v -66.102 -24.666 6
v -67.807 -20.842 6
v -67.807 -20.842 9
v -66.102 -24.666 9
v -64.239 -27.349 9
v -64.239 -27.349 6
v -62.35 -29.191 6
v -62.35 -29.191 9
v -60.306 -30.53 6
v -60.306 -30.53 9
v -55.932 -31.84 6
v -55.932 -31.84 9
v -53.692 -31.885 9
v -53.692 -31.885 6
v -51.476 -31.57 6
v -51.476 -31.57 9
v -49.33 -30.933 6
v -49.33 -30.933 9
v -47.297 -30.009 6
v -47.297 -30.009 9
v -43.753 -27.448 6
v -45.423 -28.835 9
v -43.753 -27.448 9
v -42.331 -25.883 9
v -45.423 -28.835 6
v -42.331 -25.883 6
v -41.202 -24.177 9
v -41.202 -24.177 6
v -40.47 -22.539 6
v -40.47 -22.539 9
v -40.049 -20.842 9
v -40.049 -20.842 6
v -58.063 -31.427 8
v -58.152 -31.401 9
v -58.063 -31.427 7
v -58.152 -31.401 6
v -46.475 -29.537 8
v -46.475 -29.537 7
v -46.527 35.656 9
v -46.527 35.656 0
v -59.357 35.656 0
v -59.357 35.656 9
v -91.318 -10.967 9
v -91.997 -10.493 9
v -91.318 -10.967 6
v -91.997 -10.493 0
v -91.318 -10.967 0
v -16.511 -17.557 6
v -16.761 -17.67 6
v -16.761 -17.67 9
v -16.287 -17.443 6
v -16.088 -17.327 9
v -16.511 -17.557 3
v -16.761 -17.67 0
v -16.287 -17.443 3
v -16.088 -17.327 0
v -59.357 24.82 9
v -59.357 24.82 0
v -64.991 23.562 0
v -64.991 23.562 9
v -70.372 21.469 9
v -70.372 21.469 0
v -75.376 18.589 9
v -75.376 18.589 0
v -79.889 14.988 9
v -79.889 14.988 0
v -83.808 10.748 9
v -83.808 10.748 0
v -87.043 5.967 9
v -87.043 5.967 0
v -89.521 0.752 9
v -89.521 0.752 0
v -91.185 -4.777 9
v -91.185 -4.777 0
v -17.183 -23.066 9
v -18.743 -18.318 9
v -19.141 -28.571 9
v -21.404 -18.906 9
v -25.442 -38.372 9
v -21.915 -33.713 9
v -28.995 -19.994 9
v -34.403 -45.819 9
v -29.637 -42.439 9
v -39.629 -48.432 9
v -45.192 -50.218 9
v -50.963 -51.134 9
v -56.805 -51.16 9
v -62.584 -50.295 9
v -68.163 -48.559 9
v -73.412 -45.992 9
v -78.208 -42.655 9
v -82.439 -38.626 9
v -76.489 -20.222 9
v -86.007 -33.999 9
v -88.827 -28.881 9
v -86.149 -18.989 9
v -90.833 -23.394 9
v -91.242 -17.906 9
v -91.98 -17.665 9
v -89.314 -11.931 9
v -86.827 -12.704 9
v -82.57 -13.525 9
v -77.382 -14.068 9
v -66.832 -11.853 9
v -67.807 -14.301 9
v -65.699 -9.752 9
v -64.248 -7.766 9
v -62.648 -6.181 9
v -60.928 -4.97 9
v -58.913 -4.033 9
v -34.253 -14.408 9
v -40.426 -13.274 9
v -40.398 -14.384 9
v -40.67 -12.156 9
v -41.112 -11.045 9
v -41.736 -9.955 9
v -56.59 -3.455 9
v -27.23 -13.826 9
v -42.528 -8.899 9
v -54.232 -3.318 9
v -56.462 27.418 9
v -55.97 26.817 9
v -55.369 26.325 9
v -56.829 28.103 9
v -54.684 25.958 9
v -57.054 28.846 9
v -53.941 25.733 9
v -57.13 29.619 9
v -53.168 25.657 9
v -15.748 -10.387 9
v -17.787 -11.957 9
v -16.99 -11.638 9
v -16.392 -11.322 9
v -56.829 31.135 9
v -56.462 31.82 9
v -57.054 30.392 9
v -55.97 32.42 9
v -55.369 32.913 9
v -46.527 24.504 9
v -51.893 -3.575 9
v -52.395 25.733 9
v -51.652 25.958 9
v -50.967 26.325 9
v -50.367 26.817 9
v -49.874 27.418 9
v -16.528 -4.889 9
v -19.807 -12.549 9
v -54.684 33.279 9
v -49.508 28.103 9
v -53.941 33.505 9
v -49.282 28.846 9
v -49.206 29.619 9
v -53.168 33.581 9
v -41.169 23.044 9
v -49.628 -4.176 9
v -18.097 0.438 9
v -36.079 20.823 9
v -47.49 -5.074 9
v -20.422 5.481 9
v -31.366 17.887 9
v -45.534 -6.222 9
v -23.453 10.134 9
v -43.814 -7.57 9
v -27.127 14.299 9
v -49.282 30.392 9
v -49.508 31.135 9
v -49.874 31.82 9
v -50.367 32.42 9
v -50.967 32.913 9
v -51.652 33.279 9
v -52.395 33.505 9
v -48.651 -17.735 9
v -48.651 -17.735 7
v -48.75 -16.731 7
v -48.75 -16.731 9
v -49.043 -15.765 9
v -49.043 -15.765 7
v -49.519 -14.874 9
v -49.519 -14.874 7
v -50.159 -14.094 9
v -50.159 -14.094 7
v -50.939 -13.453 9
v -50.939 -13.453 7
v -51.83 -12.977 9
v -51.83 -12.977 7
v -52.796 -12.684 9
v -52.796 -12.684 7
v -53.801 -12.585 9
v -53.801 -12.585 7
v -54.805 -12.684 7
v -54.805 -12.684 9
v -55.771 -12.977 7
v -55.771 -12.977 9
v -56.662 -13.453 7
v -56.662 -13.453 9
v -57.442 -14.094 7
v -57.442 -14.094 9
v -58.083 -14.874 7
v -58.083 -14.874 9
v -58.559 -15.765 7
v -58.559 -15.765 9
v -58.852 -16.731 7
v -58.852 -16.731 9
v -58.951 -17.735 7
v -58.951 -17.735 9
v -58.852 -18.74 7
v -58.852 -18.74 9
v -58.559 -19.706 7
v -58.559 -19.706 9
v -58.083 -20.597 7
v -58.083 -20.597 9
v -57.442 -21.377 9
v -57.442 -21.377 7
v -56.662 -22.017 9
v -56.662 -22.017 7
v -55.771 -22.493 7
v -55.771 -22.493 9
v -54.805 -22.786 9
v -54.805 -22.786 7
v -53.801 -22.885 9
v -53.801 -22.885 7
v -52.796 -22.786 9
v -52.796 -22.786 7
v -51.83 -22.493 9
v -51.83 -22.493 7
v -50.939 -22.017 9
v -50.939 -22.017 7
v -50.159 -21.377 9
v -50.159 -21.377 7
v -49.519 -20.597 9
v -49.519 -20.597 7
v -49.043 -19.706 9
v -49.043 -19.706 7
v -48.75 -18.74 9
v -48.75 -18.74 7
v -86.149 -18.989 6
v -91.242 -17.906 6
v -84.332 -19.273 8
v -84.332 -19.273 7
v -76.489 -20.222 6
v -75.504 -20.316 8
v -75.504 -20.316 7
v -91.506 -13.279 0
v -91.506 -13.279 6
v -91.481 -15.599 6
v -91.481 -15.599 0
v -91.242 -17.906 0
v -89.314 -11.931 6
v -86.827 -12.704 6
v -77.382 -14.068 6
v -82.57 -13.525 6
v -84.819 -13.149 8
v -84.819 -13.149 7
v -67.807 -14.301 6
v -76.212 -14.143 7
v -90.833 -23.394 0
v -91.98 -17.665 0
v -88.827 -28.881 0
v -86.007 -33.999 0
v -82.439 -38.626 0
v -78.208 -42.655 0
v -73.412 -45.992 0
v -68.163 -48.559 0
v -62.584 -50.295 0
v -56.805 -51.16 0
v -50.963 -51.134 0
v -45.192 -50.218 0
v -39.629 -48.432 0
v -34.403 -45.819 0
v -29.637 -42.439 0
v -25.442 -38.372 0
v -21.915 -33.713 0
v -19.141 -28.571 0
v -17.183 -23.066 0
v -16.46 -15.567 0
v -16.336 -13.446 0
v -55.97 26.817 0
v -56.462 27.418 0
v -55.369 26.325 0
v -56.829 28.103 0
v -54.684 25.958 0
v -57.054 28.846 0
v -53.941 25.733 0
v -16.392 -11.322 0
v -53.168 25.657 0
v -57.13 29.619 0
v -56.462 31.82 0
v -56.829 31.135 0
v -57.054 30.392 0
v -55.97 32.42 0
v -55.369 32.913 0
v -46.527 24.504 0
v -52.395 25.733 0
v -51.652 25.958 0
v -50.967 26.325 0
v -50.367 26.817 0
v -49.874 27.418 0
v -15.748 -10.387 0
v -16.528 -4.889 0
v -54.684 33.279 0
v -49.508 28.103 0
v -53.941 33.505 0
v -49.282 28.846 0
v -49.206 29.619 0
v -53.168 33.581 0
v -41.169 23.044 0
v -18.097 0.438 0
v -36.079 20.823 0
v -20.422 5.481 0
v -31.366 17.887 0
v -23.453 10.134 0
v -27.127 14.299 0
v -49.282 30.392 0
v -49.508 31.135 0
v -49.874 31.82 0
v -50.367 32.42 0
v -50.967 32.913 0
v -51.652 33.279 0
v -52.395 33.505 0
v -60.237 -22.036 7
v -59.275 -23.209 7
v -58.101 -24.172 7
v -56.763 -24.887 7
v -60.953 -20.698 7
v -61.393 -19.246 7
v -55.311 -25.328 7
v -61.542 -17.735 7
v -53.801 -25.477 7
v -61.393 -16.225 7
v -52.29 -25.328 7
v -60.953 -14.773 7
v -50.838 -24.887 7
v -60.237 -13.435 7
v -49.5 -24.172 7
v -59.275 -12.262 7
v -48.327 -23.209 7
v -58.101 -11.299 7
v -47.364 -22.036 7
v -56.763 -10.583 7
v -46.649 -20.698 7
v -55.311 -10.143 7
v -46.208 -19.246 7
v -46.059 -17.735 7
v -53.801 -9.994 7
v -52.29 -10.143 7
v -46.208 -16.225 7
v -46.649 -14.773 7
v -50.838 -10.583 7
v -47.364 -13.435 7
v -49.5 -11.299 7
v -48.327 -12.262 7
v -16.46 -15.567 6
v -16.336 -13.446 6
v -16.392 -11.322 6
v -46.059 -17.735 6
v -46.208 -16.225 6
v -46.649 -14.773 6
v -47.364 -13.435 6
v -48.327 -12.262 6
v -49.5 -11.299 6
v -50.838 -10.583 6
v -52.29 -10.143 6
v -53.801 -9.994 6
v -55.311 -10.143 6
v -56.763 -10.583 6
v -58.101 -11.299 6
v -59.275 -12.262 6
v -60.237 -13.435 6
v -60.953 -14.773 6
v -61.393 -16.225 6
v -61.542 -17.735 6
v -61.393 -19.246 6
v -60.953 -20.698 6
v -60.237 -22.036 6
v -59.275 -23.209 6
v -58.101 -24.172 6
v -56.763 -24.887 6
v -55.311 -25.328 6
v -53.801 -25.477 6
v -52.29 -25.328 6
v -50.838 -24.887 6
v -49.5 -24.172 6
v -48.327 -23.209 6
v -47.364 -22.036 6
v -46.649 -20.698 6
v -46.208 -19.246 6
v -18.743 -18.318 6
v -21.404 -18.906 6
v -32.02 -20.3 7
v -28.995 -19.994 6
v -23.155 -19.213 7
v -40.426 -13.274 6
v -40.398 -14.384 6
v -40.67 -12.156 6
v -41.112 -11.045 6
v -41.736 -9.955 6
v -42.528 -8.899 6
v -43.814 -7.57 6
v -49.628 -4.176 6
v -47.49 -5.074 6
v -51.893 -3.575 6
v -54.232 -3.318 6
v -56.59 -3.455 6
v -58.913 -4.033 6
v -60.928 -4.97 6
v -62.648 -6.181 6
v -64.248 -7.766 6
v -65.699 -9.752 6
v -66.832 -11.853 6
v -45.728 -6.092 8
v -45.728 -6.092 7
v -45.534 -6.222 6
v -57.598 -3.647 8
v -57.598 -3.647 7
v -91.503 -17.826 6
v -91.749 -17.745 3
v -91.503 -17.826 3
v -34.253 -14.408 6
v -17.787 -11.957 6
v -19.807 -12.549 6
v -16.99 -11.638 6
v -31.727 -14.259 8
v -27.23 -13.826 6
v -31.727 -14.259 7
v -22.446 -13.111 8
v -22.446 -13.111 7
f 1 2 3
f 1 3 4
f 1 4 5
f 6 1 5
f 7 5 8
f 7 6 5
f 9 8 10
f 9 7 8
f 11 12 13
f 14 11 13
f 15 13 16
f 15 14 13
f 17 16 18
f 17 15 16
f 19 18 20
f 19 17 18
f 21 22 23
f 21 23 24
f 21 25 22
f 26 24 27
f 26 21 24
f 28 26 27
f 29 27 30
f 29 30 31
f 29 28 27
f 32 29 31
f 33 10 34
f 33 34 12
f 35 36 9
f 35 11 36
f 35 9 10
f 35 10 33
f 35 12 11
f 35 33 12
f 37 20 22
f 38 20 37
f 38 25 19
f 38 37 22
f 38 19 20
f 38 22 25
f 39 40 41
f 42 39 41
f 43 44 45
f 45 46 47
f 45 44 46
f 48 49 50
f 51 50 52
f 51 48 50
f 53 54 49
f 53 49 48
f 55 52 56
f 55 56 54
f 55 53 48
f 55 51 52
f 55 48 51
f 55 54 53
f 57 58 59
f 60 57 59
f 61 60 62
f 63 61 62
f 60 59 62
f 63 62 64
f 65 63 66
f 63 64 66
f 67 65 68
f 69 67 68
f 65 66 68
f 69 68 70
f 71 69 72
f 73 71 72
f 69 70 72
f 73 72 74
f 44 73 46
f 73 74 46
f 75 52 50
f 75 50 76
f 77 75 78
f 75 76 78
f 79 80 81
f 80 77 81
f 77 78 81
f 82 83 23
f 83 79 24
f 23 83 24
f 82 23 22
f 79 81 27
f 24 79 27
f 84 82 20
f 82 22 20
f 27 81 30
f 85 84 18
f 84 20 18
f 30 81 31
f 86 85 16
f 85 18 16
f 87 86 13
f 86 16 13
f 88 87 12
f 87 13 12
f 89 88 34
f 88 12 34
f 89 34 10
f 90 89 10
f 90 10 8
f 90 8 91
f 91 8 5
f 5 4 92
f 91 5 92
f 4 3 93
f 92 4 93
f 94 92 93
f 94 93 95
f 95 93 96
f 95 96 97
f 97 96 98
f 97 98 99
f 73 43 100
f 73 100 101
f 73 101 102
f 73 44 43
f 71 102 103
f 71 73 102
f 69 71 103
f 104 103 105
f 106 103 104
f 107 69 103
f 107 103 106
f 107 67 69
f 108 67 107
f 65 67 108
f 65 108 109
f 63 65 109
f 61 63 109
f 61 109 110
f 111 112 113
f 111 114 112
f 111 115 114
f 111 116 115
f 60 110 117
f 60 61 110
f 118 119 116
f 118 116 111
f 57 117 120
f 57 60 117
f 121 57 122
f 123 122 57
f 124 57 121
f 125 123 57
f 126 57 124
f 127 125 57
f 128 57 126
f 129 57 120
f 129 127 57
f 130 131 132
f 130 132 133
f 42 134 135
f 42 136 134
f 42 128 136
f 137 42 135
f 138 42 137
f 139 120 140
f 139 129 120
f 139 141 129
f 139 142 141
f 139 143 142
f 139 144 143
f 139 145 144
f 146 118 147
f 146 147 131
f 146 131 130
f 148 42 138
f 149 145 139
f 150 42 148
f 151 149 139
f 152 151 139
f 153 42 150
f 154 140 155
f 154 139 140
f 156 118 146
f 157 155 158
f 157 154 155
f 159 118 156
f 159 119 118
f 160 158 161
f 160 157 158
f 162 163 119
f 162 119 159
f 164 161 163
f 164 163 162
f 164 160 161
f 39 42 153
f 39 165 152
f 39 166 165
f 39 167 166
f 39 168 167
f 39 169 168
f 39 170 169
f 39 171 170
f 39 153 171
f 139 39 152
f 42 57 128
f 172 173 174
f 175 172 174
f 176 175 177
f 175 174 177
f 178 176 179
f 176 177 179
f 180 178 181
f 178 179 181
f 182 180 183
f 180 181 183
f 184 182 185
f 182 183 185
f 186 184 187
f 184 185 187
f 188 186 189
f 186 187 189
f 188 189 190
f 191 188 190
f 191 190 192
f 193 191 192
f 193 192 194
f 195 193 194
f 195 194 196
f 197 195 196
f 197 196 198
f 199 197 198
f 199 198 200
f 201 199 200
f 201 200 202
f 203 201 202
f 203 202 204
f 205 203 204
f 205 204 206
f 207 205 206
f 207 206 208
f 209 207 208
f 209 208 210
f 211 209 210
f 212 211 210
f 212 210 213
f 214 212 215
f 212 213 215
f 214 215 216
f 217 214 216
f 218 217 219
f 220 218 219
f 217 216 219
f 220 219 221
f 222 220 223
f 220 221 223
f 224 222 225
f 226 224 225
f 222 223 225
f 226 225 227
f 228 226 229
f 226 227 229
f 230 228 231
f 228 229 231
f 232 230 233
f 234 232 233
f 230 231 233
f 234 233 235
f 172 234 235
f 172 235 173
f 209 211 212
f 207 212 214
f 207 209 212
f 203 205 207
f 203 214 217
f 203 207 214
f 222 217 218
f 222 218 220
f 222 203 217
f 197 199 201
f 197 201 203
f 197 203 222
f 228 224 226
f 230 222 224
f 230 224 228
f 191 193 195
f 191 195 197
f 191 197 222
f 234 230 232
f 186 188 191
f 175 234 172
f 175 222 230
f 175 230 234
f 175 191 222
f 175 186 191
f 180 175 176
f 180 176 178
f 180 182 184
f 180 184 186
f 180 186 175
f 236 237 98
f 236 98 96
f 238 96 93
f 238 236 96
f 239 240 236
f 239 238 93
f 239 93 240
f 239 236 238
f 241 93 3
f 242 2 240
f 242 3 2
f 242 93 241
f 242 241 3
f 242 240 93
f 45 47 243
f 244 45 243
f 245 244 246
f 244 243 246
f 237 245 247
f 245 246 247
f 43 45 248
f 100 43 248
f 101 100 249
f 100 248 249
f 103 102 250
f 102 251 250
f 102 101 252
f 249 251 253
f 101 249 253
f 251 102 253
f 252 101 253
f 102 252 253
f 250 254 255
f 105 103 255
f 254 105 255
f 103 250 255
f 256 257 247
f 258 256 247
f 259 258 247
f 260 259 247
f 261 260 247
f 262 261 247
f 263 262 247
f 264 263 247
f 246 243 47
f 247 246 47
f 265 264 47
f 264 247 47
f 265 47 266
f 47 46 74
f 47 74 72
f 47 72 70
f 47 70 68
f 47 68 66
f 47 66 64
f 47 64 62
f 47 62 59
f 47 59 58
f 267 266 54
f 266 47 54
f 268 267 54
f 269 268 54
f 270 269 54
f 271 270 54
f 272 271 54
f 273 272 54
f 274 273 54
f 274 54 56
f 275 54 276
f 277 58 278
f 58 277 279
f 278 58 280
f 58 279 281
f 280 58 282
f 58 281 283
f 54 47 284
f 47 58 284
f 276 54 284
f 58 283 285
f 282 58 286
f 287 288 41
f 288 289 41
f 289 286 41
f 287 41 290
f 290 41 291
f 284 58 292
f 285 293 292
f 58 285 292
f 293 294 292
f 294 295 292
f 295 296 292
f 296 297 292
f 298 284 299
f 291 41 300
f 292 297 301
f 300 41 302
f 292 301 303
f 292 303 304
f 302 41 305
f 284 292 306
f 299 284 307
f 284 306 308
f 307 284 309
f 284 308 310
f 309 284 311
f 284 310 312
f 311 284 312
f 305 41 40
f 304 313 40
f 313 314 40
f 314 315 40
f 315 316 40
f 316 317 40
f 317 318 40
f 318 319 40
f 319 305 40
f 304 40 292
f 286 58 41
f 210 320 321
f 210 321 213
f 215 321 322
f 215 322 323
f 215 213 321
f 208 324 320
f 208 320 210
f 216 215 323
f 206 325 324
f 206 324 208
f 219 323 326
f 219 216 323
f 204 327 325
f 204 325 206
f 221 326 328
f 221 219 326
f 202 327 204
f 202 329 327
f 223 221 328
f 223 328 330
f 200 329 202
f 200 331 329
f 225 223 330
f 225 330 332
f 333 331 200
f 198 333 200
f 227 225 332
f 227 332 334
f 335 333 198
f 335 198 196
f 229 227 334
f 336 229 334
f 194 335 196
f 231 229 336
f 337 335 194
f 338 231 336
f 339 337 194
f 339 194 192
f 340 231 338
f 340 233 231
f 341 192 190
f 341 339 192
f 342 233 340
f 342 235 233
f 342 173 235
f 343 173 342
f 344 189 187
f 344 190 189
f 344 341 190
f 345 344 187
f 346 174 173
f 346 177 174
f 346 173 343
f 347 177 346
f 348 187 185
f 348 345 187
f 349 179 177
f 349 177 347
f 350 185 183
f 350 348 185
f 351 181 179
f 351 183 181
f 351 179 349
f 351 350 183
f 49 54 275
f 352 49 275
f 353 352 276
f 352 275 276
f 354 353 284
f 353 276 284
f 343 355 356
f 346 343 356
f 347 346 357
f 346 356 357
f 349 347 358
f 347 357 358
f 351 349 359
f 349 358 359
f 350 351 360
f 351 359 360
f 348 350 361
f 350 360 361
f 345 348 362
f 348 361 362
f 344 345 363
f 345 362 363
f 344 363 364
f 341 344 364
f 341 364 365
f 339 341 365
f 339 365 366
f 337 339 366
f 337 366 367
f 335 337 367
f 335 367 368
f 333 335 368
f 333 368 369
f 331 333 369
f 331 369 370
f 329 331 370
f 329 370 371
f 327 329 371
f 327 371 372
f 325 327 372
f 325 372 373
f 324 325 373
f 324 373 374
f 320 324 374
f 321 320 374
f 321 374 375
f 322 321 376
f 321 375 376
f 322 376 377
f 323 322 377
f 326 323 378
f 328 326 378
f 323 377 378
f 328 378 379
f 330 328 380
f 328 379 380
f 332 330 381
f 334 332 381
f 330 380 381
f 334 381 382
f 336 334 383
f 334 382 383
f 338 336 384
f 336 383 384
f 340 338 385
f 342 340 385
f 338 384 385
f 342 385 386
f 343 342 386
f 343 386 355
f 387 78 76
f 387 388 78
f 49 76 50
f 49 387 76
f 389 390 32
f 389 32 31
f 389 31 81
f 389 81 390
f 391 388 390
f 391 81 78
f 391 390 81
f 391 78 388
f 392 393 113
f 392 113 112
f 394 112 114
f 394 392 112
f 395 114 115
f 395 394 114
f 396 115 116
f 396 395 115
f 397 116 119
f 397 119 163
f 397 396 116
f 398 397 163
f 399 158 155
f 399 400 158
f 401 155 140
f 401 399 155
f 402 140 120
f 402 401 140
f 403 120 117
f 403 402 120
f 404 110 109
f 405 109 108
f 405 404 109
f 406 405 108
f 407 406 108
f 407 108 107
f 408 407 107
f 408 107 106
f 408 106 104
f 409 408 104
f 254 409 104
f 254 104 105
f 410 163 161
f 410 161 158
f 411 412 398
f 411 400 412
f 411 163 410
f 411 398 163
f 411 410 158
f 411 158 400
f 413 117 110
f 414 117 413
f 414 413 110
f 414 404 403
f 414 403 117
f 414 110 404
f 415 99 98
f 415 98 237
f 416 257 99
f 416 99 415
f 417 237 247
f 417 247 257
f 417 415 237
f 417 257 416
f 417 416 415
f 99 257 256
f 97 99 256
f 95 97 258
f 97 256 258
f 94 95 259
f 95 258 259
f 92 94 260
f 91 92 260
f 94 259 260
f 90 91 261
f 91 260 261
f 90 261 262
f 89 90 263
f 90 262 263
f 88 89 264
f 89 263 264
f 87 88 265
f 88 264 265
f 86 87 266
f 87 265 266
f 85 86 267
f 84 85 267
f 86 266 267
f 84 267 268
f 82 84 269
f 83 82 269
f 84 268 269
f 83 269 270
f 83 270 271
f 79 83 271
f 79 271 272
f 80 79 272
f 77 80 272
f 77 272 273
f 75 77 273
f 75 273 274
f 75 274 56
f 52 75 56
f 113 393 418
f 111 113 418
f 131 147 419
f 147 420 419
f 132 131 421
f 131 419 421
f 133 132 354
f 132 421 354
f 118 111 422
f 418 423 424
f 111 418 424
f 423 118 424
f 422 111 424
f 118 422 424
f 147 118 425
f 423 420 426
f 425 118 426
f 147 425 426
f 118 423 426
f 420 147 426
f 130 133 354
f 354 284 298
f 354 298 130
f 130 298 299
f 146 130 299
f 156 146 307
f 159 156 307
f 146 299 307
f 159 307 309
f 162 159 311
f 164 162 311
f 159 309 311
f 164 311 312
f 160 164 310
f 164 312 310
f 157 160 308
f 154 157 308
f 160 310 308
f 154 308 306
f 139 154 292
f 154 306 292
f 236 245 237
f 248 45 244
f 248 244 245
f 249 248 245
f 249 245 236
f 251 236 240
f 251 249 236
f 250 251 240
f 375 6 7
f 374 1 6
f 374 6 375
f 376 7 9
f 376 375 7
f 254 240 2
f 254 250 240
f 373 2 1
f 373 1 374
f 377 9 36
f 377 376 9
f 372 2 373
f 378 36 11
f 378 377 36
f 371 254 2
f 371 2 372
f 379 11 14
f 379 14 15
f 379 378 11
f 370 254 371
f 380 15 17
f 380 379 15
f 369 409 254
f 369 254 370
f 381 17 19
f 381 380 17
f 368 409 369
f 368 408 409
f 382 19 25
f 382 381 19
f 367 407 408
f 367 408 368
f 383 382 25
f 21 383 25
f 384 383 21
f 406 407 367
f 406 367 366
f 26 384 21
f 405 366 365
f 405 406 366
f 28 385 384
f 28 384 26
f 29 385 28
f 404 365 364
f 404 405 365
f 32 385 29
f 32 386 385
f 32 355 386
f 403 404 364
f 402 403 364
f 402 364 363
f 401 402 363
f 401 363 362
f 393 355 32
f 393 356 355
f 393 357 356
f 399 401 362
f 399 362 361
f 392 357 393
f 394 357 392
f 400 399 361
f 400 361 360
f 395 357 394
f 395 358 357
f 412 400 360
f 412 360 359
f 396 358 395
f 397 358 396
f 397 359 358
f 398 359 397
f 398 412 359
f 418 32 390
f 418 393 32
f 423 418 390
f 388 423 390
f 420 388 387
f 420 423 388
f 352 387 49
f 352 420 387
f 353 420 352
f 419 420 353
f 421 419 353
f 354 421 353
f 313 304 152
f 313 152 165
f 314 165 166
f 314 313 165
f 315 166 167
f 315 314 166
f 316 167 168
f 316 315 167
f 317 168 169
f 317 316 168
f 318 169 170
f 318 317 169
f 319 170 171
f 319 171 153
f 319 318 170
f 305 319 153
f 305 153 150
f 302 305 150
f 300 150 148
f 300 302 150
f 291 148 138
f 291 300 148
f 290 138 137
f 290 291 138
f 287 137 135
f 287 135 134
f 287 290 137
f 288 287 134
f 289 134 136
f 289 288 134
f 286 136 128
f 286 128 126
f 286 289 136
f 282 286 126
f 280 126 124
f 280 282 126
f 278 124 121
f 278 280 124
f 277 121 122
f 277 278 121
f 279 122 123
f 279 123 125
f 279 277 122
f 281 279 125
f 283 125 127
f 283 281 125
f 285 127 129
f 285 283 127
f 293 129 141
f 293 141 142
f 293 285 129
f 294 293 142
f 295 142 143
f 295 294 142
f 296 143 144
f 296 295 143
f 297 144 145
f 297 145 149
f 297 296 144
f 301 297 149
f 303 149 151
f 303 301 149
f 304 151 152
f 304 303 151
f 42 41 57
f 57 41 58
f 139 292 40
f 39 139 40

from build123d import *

# Parameters (mm, degrees)
F0_R     = 5.150035
F0_R_2   = 3.961987
F1_DEPTH = 9
F0_R_3   = 7.741214
F2_DEPTH = 6
F3_DEPTH = 7


with BuildPart() as f1:
    # F0 (on Top) → F1 (new body)
    with BuildSketch(Plane.XY):
        with BuildLine():
            add(Edge.make_bspline(
                [(-91.317542, -10.967116), (-86.64373, -13.858178), (-75.341257, -14.445624), (-67.806959, -14.301113)],
                knots=[1.221144, 1.221144, 1.221144, 1.221144, 24.488166, 24.488166, 24.488166, 24.488166], degree=3))
            add(Edge.make_bspline(
                [(-40.39795, -14.383757), (-39.723586, -5.585385), (-61.1616, 5.31907), (-67.806959, -14.301113)],
                knots=[0, 0, 0, 0, 27.409134, 27.409134, 27.409134, 27.409134], degree=3))
            add(Edge.make_bspline(
                [(-40.39795, -14.383757), (-33.312143, -14.897632), (-19.552754, -13.304103), (-16.391562, -11.32243)],
                knots=[0, 0, 0, 0, 21.643832, 21.643832, 21.643832, 21.643832], degree=3))
            Line((-16.391562, -11.32243), (-15.747862, -10.386982))
            ThreePointArc((-15.747862, -10.386982), (-25.2145, 12.283506), (-46.526868, 24.50444))
            Line((-46.526868, 24.50444), (-46.526868, 23.27941))
            Line((-46.526868, 23.27941), (-59.356738, 23.27941))
            Line((-59.356738, 23.27941), (-59.356738, 24.820338))
            ThreePointArc((-59.356738, 24.820338), (-81.928546, 12.942305), (-91.997162, -10.49265))
            Line((-91.997162, -10.49265), (-91.317542, -10.967116))
        make_face()
        with BuildLine():
            add(Edge.make_bspline(
                [(-67.806959, -20.841723), (-61.319683, -39.555024), (-41.559912, -31.048808), (-40.048894, -20.841723)],
                knots=[0, 0, 0, 0, 27.758066, 27.758066, 27.758066, 27.758066], degree=3))
            add(Edge.make_bspline(
                [(-91.241727, -17.905849), (-86.307066, -19.370394), (-73.921331, -20.639642), (-67.806959, -20.841723)],
                knots=[1.260164, 1.260164, 1.260164, 1.260164, 24.380885, 24.380885, 24.380885, 24.380885], degree=3))
            add(Edge.make_bspline(
                [(-91.979973, -17.664781), (-91.757507, -17.745623), (-91.510684, -17.826026), (-91.241727, -17.905849)],
                knots=[0, 0, 0, 0, 1.260164, 1.260164, 1.260164, 1.260164], degree=3))
            ThreePointArc((-91.979973, -17.664781), (-53.883548, -51.259255), (-16.087698, -17.32697))
            add(Edge.make_bspline(
                [(-16.761014, -17.670424), (-16.49914, -17.558172), (-16.273367, -17.443651), (-16.087698, -17.32697)],
                knots=[22.749196, 22.749196, 22.749196, 22.749196, 24.217605, 24.217605, 24.217605, 24.217605], degree=3))
            add(Edge.make_bspline(
                [(-40.048894, -20.841723), (-33.540111, -20.603637), (-20.818081, -19.409468), (-16.761014, -17.670424)],
                knots=[0, 0, 0, 0, 22.749196, 22.749196, 22.749196, 22.749196], degree=3))
        make_face()
        with Locations((-53.800639, -17.735399)):
            Circle(F0_R)
        with BuildLine():
            Line((-59.356738, 35.656463), (-59.356738, 24.820338))
            ThreePointArc((-59.356738, 24.820338), (-52.928445, 25.204892), (-46.526868, 24.50444))
            Line((-46.526868, 24.50444), (-46.526868, 35.656463))
            Line((-46.526868, 35.656463), (-59.356738, 35.656463))
        make_face()
        with Locations((-53.168215, 29.618876)):
            Circle(F0_R_2, mode=Mode.SUBTRACT)
        with BuildLine():
            ThreePointArc((-46.526868, 24.50444), (-52.928445, 25.204892), (-59.356738, 24.820338))
            Line((-59.356738, 24.820338), (-59.356738, 23.27941))
            Line((-59.356738, 23.27941), (-46.526868, 23.27941))
            Line((-46.526868, 23.27941), (-46.526868, 24.50444))
        make_face()
    extrude(amount=F1_DEPTH)

    # F0 (on Top) → F2 (join)
    with BuildSketch(Plane.XY):
        with BuildLine():
            add(Edge.make_bspline(
                [(-91.241727, -17.905849), (-86.307066, -19.370394), (-73.921331, -20.639642), (-67.806959, -20.841723)],
                knots=[1.260164, 1.260164, 1.260164, 1.260164, 24.380885, 24.380885, 24.380885, 24.380885], degree=3))
            Line((-67.806959, -20.841723), (-67.806959, -14.301113))
            add(Edge.make_bspline(
                [(-91.317542, -10.967116), (-86.64373, -13.858178), (-75.341257, -14.445624), (-67.806959, -14.301113)],
                knots=[1.221144, 1.221144, 1.221144, 1.221144, 24.488166, 24.488166, 24.488166, 24.488166], degree=3))
            ThreePointArc((-91.317542, -10.967116), (-91.519995, -14.439109), (-91.241727, -17.905849))
        make_face()
        with BuildLine():
            Line((-40.39795, -14.383757), (-40.048894, -20.841723))
            add(Edge.make_bspline(
                [(-40.048894, -20.841723), (-33.540111, -20.603637), (-20.818081, -19.409468), (-16.761014, -17.670424)],
                knots=[0, 0, 0, 0, 22.749196, 22.749196, 22.749196, 22.749196], degree=3))
            ThreePointArc((-16.761014, -17.670424), (-16.375445, -14.508116), (-16.391562, -11.32243))
            add(Edge.make_bspline(
                [(-40.39795, -14.383757), (-33.312143, -14.897632), (-19.552754, -13.304103), (-16.391562, -11.32243)],
                knots=[0, 0, 0, 0, 21.643832, 21.643832, 21.643832, 21.643832], degree=3))
        make_face()
        with BuildLine():
            Line((-67.806959, -14.301113), (-67.806959, -20.841723))
            add(Edge.make_bspline(
                [(-67.806959, -20.841723), (-61.319683, -39.555024), (-41.559912, -31.048808), (-40.048894, -20.841723)],
                knots=[0, 0, 0, 0, 27.758066, 27.758066, 27.758066, 27.758066], degree=3))
            Line((-40.048894, -20.841723), (-40.39795, -14.383757))
            add(Edge.make_bspline(
                [(-40.39795, -14.383757), (-39.723586, -5.585385), (-61.1616, 5.31907), (-67.806959, -14.301113)],
                knots=[0, 0, 0, 0, 27.409134, 27.409134, 27.409134, 27.409134], degree=3))
        make_face()
        with Locations((-53.800639, -17.735399)):
            Circle(F0_R_3, mode=Mode.SUBTRACT)
    extrude(amount=F2_DEPTH)

    # F0 (on Top) → F3 (join)
    with BuildSketch(Plane.XY):
        with Locations((-53.800639, -17.735399)):
            Circle(F0_R_3)
        with Locations((-53.800639, -17.735399)):
            Circle(F0_R, mode=Mode.SUBTRACT)
    extrude(amount=F3_DEPTH)


solid = f1.part
